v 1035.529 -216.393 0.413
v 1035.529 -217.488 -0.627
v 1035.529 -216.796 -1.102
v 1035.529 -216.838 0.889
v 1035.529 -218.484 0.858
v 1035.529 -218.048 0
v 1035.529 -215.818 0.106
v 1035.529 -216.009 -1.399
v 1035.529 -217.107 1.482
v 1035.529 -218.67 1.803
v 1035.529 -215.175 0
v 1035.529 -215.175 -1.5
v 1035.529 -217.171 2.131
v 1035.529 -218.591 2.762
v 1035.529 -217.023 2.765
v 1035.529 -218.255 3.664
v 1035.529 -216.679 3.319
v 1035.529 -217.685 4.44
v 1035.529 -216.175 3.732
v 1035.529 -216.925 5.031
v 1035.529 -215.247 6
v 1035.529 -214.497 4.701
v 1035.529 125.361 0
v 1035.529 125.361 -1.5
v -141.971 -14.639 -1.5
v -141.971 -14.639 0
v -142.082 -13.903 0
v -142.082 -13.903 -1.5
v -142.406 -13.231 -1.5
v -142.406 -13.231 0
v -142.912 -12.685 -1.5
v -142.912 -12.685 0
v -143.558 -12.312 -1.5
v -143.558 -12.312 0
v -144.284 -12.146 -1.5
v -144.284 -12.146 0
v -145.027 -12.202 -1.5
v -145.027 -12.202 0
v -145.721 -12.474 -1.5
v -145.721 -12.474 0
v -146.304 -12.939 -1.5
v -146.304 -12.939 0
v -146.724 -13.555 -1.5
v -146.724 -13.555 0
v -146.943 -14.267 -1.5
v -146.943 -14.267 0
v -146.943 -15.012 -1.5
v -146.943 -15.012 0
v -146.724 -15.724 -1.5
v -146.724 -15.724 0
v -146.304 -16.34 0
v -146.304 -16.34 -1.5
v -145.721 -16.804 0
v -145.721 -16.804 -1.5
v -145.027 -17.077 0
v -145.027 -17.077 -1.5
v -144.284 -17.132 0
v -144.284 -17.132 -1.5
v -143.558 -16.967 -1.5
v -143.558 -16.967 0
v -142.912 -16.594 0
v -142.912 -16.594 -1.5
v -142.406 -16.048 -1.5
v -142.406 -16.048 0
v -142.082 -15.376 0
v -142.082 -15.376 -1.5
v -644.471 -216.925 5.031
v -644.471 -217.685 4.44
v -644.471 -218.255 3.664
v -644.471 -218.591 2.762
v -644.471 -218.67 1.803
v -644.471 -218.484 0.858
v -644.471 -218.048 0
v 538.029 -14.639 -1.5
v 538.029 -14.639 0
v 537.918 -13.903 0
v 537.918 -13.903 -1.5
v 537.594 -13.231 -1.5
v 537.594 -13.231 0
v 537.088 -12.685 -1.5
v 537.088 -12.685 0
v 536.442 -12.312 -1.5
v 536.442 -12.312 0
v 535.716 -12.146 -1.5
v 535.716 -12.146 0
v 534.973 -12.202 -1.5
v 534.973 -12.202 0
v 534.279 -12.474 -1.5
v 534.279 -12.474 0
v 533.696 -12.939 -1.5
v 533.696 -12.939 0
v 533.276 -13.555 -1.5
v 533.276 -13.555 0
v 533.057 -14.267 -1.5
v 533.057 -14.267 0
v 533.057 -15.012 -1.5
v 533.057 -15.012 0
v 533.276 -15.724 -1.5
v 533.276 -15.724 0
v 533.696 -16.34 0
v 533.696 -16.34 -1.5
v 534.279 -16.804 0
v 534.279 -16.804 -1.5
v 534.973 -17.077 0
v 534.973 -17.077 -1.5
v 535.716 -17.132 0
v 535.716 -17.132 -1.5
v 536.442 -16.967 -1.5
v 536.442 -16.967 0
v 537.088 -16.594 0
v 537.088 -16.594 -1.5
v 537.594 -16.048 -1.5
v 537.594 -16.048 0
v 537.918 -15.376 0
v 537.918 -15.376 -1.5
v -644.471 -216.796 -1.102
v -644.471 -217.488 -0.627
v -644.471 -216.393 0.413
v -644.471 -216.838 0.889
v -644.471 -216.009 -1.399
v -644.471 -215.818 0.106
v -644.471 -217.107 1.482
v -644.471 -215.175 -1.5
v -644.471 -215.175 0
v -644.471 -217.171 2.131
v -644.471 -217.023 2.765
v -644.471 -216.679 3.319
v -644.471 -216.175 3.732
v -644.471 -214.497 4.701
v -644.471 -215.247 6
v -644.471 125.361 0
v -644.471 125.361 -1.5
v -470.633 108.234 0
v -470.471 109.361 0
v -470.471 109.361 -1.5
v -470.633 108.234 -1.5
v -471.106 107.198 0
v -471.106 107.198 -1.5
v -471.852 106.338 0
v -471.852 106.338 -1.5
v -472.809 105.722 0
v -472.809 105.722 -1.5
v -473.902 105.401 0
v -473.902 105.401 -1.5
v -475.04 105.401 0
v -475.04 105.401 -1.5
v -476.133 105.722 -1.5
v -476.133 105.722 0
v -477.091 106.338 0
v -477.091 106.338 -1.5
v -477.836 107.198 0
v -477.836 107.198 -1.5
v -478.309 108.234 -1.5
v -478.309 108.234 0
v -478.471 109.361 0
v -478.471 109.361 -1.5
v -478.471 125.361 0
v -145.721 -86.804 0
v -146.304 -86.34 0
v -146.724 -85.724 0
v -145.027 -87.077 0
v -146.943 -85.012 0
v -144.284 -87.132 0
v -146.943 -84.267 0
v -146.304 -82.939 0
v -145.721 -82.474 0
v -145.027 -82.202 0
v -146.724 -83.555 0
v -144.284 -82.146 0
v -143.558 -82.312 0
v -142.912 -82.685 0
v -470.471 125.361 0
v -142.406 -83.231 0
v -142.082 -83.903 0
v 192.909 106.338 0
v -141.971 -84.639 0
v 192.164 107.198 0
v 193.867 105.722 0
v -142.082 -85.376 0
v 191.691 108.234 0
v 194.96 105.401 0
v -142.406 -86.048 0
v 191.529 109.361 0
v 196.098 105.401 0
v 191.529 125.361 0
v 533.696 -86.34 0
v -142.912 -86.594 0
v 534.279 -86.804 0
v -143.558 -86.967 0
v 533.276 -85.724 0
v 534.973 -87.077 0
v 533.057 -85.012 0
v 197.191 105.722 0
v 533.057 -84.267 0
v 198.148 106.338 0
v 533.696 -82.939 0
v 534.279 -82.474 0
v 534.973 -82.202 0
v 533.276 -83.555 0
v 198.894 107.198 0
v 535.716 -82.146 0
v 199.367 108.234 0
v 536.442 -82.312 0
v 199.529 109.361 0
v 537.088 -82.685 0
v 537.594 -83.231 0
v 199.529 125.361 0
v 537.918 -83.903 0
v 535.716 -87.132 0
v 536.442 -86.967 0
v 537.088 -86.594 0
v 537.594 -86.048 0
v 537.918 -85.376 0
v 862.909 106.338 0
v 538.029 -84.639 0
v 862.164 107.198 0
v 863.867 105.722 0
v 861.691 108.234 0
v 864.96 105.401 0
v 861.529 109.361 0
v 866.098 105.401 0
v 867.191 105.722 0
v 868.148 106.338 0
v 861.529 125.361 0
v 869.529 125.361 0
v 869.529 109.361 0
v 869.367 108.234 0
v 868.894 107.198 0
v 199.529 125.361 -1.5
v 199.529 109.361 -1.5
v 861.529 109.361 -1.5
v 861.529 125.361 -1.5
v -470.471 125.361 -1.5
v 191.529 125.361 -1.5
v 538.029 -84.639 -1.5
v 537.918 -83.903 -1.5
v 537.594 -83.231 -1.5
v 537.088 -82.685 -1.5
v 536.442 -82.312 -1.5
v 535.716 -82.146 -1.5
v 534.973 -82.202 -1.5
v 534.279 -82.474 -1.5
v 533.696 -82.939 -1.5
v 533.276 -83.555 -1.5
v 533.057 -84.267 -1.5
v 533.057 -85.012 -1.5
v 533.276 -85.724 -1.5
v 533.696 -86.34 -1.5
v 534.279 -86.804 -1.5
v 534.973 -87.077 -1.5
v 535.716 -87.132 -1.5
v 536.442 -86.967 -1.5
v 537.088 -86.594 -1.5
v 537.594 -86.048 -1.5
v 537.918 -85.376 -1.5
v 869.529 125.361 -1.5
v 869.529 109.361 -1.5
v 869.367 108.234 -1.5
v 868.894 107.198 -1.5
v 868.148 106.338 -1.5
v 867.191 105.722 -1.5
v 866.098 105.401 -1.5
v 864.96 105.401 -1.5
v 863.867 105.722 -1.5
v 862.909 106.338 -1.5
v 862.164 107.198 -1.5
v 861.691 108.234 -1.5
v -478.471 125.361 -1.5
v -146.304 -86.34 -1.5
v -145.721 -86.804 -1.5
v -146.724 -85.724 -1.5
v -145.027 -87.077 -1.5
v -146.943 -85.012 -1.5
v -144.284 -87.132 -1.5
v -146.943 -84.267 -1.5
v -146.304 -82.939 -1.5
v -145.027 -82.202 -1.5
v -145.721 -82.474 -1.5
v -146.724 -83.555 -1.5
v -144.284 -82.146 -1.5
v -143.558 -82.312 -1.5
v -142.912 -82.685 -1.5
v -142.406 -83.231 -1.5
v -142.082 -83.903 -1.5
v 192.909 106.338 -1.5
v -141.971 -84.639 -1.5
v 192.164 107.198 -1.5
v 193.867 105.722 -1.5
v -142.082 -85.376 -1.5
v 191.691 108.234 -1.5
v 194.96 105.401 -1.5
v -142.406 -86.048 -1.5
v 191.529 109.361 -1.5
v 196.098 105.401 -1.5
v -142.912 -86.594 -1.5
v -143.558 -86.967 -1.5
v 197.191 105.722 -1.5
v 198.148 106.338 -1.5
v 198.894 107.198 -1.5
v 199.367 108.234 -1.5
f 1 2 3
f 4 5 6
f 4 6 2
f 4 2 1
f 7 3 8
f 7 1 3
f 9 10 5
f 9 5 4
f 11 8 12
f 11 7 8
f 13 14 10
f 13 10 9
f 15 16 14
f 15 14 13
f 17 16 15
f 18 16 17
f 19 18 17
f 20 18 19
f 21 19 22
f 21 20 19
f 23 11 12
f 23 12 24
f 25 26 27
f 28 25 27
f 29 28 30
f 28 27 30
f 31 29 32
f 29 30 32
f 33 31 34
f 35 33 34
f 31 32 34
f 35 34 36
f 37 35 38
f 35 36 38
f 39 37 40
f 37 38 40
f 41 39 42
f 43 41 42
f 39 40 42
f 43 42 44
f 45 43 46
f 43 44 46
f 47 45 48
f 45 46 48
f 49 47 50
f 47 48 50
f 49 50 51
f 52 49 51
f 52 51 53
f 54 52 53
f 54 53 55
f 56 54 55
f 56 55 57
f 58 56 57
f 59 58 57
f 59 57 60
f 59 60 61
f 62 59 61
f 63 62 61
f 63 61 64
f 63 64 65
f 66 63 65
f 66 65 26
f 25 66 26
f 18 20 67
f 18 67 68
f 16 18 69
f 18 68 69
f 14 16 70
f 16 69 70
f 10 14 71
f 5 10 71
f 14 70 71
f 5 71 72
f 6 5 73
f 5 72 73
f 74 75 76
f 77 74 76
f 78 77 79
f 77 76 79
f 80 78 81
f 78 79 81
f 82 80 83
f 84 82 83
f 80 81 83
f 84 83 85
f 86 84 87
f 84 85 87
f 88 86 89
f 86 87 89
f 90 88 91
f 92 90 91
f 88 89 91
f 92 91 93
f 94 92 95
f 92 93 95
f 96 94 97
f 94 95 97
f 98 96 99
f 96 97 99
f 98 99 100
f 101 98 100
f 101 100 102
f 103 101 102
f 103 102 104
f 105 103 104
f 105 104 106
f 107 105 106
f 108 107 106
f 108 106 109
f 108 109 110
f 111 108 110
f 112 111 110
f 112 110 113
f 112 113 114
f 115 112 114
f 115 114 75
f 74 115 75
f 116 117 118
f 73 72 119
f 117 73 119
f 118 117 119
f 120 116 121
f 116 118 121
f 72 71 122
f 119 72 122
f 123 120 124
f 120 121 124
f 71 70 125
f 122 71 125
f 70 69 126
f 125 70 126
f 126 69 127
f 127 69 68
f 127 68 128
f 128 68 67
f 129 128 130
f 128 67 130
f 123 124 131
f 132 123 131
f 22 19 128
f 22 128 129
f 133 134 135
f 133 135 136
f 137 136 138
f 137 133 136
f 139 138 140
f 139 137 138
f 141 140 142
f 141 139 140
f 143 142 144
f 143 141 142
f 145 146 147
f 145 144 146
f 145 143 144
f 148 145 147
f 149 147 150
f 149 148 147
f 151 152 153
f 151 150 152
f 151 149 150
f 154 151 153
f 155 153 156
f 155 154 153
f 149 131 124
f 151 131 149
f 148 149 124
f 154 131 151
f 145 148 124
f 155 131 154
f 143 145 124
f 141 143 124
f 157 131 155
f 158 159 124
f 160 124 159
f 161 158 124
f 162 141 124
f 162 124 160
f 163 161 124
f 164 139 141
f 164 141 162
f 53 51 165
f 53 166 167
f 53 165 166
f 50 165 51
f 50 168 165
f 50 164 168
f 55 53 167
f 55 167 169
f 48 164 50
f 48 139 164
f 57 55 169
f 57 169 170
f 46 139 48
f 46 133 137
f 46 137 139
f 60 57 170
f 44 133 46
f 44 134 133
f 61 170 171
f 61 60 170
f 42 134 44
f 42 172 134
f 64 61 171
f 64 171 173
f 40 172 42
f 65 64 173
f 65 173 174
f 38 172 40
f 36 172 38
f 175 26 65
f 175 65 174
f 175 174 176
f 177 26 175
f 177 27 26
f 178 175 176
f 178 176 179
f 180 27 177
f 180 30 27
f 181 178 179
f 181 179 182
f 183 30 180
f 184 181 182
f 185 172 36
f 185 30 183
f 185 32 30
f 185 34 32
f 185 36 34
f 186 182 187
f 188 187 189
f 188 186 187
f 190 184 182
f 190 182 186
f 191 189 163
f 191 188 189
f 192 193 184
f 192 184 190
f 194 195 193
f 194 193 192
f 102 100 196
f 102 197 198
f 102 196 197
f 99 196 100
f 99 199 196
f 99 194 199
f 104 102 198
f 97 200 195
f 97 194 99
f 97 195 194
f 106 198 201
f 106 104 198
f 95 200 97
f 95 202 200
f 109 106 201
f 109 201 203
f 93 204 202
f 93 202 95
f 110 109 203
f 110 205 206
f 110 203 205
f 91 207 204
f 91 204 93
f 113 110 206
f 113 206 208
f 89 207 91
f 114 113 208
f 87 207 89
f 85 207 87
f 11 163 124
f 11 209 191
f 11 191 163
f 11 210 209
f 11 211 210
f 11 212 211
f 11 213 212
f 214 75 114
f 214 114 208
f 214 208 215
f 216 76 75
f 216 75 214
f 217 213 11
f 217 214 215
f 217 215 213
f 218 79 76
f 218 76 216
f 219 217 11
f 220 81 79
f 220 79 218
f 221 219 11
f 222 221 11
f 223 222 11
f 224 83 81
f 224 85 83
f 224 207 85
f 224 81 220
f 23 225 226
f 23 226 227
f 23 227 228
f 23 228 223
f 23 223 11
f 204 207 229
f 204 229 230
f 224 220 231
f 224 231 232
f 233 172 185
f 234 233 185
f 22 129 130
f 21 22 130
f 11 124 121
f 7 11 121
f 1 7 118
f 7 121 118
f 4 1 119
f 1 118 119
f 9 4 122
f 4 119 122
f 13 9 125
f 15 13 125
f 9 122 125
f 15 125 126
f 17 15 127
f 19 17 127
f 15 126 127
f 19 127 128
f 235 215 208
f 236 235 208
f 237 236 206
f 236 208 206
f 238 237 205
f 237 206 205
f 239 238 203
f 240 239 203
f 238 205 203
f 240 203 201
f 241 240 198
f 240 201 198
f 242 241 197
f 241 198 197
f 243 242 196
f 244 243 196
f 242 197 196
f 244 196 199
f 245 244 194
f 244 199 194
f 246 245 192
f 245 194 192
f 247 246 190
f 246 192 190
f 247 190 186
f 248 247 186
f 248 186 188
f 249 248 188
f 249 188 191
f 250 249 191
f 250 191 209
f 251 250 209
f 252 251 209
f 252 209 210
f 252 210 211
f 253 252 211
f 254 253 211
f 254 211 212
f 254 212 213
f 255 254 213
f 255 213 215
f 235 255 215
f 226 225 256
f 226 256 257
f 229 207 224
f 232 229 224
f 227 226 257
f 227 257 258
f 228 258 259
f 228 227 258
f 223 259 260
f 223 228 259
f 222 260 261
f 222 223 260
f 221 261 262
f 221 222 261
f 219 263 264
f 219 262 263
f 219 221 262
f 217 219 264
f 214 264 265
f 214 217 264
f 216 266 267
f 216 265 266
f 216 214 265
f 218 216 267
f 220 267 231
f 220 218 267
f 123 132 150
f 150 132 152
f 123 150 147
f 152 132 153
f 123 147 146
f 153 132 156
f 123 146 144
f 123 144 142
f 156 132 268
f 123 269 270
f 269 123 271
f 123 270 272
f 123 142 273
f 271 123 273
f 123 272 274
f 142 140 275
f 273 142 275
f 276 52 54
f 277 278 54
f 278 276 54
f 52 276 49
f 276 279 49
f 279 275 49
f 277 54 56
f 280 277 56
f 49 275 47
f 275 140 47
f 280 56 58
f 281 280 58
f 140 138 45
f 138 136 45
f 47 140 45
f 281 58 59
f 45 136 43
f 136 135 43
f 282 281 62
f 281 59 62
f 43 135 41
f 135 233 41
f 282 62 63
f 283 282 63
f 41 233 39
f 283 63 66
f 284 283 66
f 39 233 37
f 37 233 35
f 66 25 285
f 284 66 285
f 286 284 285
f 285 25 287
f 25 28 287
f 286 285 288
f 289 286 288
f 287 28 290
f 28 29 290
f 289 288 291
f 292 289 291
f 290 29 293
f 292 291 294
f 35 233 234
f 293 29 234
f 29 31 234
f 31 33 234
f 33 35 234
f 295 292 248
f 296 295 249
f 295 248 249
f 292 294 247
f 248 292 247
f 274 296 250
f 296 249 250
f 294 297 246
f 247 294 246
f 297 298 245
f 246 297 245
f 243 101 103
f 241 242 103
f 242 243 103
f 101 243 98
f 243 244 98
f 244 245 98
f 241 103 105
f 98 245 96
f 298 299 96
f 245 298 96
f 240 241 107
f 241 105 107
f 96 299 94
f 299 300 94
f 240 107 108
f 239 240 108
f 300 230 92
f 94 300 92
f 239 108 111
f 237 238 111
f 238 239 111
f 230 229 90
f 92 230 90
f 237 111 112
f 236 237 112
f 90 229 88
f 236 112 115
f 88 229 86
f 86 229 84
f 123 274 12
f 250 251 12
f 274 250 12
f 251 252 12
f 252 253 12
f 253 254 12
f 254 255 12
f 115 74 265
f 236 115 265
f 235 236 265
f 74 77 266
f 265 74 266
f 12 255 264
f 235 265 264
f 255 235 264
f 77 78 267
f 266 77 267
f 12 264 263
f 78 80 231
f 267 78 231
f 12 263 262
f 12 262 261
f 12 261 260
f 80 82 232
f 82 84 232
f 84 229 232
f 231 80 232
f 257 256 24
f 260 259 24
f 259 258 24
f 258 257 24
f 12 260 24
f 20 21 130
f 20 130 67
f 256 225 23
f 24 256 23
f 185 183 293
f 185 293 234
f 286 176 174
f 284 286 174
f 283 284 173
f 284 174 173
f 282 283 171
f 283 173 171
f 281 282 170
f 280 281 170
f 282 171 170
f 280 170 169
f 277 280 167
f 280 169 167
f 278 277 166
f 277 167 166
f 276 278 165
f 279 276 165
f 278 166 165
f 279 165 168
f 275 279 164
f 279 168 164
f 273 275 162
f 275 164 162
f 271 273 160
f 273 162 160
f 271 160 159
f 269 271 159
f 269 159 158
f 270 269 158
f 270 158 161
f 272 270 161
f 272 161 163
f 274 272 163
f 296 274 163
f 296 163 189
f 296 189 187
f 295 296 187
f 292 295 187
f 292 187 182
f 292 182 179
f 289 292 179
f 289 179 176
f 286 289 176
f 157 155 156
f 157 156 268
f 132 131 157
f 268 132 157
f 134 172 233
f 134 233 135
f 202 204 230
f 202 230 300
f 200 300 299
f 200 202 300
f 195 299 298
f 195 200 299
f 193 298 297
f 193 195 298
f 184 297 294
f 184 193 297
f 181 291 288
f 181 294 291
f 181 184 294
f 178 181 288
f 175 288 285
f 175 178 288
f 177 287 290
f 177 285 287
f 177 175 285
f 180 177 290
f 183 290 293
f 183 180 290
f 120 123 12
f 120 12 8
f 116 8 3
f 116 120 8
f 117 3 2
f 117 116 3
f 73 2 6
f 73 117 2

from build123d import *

# Parameters (mm, degrees)
SKETCH1_W            = 1680
SKETCH1_H            = 351
BASE_FLANGE1_DEPTH   = 1.5
EDGE_FLANGE1_START   = -644.471153846
EDGE_FLANGE1_DEPTH   = 1680
EDGE_FLANGE1_2_DEPTH = 1680
SKETCH9_R            = 2.5
CUT_EXTRUDE1_DEPTH   = 10


# Read off the part's stored shape, not the designer's step: Edge-Flange1
# Sheet-metal steps are written as plain solids
with BuildPart() as part:
    # Sketch1 → Base-Flange1 (new body)
    with BuildSketch(Plane.XY):
        with Locations((195.528846154, -50.139423077)):
            Rectangle(SKETCH1_W, SKETCH1_H)
    extrude(amount=-BASE_FLANGE1_DEPTH)

    # Edge-Flange1 outline → Edge-Flange1 (cut)
    with BuildSketch(Plane.YZ.offset(EDGE_FLANGE1_START)):
        with BuildLine():
            ThreePointArc((-215.175321462, -1.5), (-216.795506637, -1.102418412), (-218.047602785, 0))
            Line((-218.047602785, 0), (-225.639423077, 0))
            Line((-225.639423077, 0), (-225.639423077, -1.5))
            Line((-225.639423077, -1.5), (-215.175321462, -1.5))
        make_face()
    extrude(amount=EDGE_FLANGE1_DEPTH, mode=Mode.SUBTRACT)

    # Edge-Flange1 2 outline → Edge-Flange1 2 (add)
    with BuildSketch(Plane.YZ.offset(EDGE_FLANGE1_START)):
        with BuildLine():
            Line((-215.247118232, 6), (-216.925321462, 5.031088913))
            ThreePointArc((-216.925321462, 5.031088913), (-218.591362309, 2.762013733), (-218.047602785, 0))
            Line((-218.047602785, 0), (-215.175321462, 0))
            ThreePointArc((-215.175321462, 0), (-217.107173114, 1.48236191), (-216.175321462, 3.732050808))
            Line((-216.175321462, 3.732050808), (-214.497118232, 4.700961894))
            Line((-214.497118232, 4.700961894), (-215.247118232, 6))
        make_face()
    extrude(amount=EDGE_FLANGE1_2_DEPTH)

    # Sketch9 → Cut-Extrude1 (cut)
    with BuildSketch(Plane.XY):
        with Locations((-144.471153846, -14.639423077)):
            Circle(SKETCH9_R)
        with Locations((-144.471153846, -84.639423077)):
            Circle(SKETCH9_R)
        with Locations((535.528846154, -84.639423077)):
            Circle(SKETCH9_R)
        with Locations((535.528846154, -14.639423077)):
            Circle(SKETCH9_R)
        with BuildLine():
            Line((869.528846154, 125.360576923), (869.528846154, 109.360576923))
            ThreePointArc((869.528846154, 109.360576923), (865.528846154, 105.360576923), (861.528846154, 109.360576923))
            Line((861.528846154, 109.360576923), (861.528846154, 125.360576923))
            ThreePointArc((861.528846154, 125.360576923), (865.528846154, 129.360576923), (869.528846154, 125.360576923))
        make_face()
        with BuildLine():
            Line((199.528846154, 125.360576923), (199.528846154, 109.360576923))
            ThreePointArc((199.528846154, 109.360576923), (195.528846154, 105.360576923), (191.528846154, 109.360576923))
            Line((191.528846154, 109.360576923), (191.528846154, 125.360576923))
            ThreePointArc((191.528846154, 125.360576923), (195.528846154, 129.360576923), (199.528846154, 125.360576923))
        make_face()
        with BuildLine():
            Line((-470.471153846, 125.360576923), (-470.471153846, 109.360576923))
            ThreePointArc((-470.471153846, 109.360576923), (-474.471153846, 105.360576923), (-478.471153846, 109.360576923))
            Line((-478.471153846, 109.360576923), (-478.471153846, 125.360576923))
            ThreePointArc((-478.471153846, 125.360576923), (-474.471153846, 129.360576923), (-470.471153846, 125.360576923))
        make_face()
    extrude(amount=-CUT_EXTRUDE1_DEPTH, mode=Mode.SUBTRACT)


solid = part.part
